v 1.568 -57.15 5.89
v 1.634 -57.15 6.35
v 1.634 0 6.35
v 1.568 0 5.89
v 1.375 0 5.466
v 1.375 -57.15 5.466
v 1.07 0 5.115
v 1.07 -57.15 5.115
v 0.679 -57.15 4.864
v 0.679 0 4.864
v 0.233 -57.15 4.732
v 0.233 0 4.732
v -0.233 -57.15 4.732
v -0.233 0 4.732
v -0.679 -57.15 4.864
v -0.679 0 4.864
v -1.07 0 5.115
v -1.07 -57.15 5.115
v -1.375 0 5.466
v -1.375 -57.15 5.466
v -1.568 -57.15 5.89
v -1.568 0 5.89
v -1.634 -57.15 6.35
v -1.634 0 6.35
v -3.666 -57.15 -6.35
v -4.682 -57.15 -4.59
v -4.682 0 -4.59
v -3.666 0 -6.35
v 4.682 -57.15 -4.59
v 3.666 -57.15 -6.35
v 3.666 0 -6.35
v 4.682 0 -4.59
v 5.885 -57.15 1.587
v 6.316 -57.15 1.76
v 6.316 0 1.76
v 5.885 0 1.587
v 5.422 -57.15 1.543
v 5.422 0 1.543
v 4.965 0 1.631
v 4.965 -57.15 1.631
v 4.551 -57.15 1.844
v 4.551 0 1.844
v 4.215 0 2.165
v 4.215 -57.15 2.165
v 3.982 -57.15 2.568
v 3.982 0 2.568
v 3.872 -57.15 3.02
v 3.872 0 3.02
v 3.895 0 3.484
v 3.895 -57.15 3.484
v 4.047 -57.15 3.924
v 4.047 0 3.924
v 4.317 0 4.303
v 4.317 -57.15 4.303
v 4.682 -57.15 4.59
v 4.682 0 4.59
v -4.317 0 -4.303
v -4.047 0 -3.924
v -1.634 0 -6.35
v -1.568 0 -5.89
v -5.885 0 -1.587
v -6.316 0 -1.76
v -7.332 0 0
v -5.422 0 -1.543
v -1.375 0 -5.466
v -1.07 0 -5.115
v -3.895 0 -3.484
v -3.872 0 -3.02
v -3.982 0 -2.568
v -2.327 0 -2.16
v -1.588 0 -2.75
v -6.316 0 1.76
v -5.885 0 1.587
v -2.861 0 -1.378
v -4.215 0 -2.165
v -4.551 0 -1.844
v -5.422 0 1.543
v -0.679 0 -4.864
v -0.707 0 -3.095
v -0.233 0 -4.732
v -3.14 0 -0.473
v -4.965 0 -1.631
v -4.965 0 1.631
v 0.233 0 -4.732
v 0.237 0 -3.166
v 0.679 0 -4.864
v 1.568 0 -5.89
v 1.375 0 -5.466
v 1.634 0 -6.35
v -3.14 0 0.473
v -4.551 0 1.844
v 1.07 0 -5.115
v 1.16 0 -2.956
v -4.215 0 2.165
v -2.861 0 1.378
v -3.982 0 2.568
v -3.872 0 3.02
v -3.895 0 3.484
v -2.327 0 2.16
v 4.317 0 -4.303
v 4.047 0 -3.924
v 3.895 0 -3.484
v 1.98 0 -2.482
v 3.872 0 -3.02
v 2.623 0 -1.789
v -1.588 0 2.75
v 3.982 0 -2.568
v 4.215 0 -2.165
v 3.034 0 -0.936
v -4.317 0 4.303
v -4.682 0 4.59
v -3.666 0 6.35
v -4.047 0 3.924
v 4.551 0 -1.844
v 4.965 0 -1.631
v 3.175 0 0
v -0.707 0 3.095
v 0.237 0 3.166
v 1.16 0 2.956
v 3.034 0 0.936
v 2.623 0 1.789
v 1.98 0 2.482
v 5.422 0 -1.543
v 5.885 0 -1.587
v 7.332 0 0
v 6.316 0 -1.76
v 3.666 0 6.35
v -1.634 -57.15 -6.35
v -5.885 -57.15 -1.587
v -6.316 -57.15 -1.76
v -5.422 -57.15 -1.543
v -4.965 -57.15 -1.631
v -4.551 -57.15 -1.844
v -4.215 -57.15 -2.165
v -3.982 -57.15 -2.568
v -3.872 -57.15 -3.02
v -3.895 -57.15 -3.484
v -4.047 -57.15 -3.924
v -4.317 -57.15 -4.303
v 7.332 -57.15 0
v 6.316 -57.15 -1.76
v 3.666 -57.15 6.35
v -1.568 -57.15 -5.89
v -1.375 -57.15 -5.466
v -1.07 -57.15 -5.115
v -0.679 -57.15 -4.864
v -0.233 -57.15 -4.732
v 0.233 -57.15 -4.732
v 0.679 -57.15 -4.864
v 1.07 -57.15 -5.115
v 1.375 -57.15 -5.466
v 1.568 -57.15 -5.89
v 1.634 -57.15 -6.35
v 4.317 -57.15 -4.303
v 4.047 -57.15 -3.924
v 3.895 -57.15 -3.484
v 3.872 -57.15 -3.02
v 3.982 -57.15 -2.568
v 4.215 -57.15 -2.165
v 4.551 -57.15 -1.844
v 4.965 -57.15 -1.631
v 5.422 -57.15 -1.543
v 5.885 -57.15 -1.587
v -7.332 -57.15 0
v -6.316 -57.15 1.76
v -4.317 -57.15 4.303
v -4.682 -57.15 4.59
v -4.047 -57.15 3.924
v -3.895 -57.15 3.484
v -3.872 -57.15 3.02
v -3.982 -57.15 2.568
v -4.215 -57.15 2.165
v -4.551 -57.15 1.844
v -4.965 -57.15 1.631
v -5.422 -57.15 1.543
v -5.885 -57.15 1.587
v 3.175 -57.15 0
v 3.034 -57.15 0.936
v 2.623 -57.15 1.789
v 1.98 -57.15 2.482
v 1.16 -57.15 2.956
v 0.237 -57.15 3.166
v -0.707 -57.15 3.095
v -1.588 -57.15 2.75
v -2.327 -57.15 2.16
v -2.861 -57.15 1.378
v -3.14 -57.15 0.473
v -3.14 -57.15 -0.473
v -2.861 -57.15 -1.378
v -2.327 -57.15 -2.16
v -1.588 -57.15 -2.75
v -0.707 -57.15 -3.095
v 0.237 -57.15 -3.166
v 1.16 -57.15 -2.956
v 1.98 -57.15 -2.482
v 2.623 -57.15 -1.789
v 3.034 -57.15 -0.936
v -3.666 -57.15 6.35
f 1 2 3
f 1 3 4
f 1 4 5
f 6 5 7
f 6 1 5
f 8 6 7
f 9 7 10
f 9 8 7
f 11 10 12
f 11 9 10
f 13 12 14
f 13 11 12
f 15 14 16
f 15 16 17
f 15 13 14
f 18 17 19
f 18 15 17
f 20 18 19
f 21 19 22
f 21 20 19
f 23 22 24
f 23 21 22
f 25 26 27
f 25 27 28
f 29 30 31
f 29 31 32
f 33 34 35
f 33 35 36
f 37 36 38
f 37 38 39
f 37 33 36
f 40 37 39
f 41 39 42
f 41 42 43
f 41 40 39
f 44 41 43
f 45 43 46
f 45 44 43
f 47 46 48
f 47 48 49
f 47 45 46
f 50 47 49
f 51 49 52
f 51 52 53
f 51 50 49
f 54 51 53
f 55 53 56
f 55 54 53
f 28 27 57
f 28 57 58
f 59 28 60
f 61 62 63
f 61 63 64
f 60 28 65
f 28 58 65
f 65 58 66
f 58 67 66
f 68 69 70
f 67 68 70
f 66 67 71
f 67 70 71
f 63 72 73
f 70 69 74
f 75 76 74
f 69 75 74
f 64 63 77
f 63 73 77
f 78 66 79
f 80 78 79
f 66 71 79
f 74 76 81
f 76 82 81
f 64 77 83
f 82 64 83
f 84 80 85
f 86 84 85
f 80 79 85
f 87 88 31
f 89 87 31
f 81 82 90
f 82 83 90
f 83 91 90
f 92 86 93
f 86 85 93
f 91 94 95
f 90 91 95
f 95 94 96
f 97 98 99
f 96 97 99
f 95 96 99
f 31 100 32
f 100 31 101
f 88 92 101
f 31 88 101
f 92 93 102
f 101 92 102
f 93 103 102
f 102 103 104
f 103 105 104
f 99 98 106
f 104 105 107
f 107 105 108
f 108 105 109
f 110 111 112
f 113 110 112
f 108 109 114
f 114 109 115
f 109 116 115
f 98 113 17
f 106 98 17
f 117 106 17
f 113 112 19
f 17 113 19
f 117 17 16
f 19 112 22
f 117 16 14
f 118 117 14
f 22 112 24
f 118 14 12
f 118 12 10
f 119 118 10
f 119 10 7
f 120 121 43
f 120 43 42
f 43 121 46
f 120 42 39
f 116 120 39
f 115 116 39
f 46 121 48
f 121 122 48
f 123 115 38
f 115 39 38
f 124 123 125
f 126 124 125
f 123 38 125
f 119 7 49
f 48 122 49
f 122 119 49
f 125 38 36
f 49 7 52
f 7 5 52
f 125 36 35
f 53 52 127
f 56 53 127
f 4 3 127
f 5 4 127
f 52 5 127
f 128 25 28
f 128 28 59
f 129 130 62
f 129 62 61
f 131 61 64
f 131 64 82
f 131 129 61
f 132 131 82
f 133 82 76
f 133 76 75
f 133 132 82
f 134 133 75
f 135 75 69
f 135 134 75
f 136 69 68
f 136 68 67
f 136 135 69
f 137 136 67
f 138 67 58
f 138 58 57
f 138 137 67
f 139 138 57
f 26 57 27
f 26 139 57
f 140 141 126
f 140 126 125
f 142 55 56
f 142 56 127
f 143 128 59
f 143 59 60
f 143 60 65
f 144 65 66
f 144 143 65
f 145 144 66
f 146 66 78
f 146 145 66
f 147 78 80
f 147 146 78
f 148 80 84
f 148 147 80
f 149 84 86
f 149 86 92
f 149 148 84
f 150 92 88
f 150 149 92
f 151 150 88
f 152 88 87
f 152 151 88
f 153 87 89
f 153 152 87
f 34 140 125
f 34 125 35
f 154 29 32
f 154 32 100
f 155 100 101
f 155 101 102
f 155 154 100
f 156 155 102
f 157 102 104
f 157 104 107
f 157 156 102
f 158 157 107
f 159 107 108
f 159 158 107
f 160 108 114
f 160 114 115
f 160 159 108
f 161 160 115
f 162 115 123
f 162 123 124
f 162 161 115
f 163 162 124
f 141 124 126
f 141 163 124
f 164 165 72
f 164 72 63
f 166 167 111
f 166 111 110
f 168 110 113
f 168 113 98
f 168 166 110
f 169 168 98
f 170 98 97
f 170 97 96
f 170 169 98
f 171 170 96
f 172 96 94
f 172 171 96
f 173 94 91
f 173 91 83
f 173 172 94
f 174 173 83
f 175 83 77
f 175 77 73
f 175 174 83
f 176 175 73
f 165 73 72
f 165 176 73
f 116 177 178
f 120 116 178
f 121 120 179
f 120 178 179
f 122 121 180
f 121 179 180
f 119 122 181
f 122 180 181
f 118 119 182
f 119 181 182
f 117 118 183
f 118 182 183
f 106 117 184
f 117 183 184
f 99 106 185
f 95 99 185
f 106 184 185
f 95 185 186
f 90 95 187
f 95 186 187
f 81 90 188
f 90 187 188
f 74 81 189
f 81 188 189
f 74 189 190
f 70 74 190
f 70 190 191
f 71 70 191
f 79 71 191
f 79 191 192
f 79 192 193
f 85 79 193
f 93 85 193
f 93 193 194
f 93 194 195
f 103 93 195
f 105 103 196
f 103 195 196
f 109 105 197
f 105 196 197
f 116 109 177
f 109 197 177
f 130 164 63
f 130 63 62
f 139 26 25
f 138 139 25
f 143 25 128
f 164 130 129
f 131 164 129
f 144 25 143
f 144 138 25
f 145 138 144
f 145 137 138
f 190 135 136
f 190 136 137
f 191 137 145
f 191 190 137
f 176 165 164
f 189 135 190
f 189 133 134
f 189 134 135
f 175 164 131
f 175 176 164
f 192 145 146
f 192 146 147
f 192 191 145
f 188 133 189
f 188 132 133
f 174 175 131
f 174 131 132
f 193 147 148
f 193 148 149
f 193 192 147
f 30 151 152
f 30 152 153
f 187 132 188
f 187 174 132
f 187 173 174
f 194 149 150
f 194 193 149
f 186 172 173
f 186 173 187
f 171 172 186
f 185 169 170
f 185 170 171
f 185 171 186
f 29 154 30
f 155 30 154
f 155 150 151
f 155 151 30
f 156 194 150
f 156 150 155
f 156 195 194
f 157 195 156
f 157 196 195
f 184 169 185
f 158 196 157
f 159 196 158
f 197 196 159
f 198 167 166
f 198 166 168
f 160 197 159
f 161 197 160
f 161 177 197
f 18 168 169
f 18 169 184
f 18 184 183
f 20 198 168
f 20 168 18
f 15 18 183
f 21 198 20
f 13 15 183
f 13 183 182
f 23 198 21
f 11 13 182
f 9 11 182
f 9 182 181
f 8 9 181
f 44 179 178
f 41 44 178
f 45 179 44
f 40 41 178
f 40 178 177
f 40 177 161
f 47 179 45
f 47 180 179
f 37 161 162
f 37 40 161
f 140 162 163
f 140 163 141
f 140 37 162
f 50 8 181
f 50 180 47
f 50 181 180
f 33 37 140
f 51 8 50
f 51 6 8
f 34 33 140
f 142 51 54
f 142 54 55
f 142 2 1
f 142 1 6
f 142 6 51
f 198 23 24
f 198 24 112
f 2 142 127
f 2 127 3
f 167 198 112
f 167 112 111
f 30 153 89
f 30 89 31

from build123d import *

# Parameters (mm, degrees)
SKETCH1_R           = 3.175
BOSS_EXTRUDE1_DEPTH = 57.15


with BuildPart() as part:
    # Sketch1 → Boss-Extrude1 (new body)
    with BuildSketch(Plane.XZ.offset(57.15)):
        with BuildLine():
            Line((-4.682174209, -4.59023638), (-3.666174209, -6.35))
            Line((-3.666174209, -6.35), (-1.634174209, -6.35))
            ThreePointArc((-1.634174209, -6.35), (0, -4.715825791), (1.634174209, -6.35))
            Line((1.634174209, -6.35), (3.666174209, -6.35))
            Line((3.666174209, -6.35), (4.682174209, -4.59023638))
            ThreePointArc((4.682174209, -4.59023638), (4.084024935, -2.357912895), (6.316348419, -1.75976362))
            Line((6.316348419, -1.75976362), (7.332348419, 0))
            Line((7.332348419, 0), (6.316348419, 1.75976362))
            ThreePointArc((6.316348419, 1.75976362), (4.084024935, 2.357912895), (4.682174209, 4.59023638))
            Line((4.682174209, 4.59023638), (3.666174209, 6.35))
            Line((3.666174209, 6.35), (1.634174209, 6.35))
            ThreePointArc((1.634174209, 6.35), (0, 4.715825791), (-1.634174209, 6.35))
            Line((-1.634174209, 6.35), (-3.666174209, 6.35))
            Line((-3.666174209, 6.35), (-4.682174209, 4.59023638))
            ThreePointArc((-4.682174209, 4.59023638), (-4.084024935, 2.357912895), (-6.316348419, 1.75976362))
            Line((-6.316348419, 1.75976362), (-7.332348419, 0))
            Line((-7.332348419, 0), (-6.316348419, -1.75976362))
            ThreePointArc((-6.316348419, -1.75976362), (-4.084024935, -2.357912895), (-4.682174209, -4.59023638))
        make_face()
        Circle(SKETCH1_R, mode=Mode.SUBTRACT)
    extrude(amount=-BOSS_EXTRUDE1_DEPTH)


solid = part.part
